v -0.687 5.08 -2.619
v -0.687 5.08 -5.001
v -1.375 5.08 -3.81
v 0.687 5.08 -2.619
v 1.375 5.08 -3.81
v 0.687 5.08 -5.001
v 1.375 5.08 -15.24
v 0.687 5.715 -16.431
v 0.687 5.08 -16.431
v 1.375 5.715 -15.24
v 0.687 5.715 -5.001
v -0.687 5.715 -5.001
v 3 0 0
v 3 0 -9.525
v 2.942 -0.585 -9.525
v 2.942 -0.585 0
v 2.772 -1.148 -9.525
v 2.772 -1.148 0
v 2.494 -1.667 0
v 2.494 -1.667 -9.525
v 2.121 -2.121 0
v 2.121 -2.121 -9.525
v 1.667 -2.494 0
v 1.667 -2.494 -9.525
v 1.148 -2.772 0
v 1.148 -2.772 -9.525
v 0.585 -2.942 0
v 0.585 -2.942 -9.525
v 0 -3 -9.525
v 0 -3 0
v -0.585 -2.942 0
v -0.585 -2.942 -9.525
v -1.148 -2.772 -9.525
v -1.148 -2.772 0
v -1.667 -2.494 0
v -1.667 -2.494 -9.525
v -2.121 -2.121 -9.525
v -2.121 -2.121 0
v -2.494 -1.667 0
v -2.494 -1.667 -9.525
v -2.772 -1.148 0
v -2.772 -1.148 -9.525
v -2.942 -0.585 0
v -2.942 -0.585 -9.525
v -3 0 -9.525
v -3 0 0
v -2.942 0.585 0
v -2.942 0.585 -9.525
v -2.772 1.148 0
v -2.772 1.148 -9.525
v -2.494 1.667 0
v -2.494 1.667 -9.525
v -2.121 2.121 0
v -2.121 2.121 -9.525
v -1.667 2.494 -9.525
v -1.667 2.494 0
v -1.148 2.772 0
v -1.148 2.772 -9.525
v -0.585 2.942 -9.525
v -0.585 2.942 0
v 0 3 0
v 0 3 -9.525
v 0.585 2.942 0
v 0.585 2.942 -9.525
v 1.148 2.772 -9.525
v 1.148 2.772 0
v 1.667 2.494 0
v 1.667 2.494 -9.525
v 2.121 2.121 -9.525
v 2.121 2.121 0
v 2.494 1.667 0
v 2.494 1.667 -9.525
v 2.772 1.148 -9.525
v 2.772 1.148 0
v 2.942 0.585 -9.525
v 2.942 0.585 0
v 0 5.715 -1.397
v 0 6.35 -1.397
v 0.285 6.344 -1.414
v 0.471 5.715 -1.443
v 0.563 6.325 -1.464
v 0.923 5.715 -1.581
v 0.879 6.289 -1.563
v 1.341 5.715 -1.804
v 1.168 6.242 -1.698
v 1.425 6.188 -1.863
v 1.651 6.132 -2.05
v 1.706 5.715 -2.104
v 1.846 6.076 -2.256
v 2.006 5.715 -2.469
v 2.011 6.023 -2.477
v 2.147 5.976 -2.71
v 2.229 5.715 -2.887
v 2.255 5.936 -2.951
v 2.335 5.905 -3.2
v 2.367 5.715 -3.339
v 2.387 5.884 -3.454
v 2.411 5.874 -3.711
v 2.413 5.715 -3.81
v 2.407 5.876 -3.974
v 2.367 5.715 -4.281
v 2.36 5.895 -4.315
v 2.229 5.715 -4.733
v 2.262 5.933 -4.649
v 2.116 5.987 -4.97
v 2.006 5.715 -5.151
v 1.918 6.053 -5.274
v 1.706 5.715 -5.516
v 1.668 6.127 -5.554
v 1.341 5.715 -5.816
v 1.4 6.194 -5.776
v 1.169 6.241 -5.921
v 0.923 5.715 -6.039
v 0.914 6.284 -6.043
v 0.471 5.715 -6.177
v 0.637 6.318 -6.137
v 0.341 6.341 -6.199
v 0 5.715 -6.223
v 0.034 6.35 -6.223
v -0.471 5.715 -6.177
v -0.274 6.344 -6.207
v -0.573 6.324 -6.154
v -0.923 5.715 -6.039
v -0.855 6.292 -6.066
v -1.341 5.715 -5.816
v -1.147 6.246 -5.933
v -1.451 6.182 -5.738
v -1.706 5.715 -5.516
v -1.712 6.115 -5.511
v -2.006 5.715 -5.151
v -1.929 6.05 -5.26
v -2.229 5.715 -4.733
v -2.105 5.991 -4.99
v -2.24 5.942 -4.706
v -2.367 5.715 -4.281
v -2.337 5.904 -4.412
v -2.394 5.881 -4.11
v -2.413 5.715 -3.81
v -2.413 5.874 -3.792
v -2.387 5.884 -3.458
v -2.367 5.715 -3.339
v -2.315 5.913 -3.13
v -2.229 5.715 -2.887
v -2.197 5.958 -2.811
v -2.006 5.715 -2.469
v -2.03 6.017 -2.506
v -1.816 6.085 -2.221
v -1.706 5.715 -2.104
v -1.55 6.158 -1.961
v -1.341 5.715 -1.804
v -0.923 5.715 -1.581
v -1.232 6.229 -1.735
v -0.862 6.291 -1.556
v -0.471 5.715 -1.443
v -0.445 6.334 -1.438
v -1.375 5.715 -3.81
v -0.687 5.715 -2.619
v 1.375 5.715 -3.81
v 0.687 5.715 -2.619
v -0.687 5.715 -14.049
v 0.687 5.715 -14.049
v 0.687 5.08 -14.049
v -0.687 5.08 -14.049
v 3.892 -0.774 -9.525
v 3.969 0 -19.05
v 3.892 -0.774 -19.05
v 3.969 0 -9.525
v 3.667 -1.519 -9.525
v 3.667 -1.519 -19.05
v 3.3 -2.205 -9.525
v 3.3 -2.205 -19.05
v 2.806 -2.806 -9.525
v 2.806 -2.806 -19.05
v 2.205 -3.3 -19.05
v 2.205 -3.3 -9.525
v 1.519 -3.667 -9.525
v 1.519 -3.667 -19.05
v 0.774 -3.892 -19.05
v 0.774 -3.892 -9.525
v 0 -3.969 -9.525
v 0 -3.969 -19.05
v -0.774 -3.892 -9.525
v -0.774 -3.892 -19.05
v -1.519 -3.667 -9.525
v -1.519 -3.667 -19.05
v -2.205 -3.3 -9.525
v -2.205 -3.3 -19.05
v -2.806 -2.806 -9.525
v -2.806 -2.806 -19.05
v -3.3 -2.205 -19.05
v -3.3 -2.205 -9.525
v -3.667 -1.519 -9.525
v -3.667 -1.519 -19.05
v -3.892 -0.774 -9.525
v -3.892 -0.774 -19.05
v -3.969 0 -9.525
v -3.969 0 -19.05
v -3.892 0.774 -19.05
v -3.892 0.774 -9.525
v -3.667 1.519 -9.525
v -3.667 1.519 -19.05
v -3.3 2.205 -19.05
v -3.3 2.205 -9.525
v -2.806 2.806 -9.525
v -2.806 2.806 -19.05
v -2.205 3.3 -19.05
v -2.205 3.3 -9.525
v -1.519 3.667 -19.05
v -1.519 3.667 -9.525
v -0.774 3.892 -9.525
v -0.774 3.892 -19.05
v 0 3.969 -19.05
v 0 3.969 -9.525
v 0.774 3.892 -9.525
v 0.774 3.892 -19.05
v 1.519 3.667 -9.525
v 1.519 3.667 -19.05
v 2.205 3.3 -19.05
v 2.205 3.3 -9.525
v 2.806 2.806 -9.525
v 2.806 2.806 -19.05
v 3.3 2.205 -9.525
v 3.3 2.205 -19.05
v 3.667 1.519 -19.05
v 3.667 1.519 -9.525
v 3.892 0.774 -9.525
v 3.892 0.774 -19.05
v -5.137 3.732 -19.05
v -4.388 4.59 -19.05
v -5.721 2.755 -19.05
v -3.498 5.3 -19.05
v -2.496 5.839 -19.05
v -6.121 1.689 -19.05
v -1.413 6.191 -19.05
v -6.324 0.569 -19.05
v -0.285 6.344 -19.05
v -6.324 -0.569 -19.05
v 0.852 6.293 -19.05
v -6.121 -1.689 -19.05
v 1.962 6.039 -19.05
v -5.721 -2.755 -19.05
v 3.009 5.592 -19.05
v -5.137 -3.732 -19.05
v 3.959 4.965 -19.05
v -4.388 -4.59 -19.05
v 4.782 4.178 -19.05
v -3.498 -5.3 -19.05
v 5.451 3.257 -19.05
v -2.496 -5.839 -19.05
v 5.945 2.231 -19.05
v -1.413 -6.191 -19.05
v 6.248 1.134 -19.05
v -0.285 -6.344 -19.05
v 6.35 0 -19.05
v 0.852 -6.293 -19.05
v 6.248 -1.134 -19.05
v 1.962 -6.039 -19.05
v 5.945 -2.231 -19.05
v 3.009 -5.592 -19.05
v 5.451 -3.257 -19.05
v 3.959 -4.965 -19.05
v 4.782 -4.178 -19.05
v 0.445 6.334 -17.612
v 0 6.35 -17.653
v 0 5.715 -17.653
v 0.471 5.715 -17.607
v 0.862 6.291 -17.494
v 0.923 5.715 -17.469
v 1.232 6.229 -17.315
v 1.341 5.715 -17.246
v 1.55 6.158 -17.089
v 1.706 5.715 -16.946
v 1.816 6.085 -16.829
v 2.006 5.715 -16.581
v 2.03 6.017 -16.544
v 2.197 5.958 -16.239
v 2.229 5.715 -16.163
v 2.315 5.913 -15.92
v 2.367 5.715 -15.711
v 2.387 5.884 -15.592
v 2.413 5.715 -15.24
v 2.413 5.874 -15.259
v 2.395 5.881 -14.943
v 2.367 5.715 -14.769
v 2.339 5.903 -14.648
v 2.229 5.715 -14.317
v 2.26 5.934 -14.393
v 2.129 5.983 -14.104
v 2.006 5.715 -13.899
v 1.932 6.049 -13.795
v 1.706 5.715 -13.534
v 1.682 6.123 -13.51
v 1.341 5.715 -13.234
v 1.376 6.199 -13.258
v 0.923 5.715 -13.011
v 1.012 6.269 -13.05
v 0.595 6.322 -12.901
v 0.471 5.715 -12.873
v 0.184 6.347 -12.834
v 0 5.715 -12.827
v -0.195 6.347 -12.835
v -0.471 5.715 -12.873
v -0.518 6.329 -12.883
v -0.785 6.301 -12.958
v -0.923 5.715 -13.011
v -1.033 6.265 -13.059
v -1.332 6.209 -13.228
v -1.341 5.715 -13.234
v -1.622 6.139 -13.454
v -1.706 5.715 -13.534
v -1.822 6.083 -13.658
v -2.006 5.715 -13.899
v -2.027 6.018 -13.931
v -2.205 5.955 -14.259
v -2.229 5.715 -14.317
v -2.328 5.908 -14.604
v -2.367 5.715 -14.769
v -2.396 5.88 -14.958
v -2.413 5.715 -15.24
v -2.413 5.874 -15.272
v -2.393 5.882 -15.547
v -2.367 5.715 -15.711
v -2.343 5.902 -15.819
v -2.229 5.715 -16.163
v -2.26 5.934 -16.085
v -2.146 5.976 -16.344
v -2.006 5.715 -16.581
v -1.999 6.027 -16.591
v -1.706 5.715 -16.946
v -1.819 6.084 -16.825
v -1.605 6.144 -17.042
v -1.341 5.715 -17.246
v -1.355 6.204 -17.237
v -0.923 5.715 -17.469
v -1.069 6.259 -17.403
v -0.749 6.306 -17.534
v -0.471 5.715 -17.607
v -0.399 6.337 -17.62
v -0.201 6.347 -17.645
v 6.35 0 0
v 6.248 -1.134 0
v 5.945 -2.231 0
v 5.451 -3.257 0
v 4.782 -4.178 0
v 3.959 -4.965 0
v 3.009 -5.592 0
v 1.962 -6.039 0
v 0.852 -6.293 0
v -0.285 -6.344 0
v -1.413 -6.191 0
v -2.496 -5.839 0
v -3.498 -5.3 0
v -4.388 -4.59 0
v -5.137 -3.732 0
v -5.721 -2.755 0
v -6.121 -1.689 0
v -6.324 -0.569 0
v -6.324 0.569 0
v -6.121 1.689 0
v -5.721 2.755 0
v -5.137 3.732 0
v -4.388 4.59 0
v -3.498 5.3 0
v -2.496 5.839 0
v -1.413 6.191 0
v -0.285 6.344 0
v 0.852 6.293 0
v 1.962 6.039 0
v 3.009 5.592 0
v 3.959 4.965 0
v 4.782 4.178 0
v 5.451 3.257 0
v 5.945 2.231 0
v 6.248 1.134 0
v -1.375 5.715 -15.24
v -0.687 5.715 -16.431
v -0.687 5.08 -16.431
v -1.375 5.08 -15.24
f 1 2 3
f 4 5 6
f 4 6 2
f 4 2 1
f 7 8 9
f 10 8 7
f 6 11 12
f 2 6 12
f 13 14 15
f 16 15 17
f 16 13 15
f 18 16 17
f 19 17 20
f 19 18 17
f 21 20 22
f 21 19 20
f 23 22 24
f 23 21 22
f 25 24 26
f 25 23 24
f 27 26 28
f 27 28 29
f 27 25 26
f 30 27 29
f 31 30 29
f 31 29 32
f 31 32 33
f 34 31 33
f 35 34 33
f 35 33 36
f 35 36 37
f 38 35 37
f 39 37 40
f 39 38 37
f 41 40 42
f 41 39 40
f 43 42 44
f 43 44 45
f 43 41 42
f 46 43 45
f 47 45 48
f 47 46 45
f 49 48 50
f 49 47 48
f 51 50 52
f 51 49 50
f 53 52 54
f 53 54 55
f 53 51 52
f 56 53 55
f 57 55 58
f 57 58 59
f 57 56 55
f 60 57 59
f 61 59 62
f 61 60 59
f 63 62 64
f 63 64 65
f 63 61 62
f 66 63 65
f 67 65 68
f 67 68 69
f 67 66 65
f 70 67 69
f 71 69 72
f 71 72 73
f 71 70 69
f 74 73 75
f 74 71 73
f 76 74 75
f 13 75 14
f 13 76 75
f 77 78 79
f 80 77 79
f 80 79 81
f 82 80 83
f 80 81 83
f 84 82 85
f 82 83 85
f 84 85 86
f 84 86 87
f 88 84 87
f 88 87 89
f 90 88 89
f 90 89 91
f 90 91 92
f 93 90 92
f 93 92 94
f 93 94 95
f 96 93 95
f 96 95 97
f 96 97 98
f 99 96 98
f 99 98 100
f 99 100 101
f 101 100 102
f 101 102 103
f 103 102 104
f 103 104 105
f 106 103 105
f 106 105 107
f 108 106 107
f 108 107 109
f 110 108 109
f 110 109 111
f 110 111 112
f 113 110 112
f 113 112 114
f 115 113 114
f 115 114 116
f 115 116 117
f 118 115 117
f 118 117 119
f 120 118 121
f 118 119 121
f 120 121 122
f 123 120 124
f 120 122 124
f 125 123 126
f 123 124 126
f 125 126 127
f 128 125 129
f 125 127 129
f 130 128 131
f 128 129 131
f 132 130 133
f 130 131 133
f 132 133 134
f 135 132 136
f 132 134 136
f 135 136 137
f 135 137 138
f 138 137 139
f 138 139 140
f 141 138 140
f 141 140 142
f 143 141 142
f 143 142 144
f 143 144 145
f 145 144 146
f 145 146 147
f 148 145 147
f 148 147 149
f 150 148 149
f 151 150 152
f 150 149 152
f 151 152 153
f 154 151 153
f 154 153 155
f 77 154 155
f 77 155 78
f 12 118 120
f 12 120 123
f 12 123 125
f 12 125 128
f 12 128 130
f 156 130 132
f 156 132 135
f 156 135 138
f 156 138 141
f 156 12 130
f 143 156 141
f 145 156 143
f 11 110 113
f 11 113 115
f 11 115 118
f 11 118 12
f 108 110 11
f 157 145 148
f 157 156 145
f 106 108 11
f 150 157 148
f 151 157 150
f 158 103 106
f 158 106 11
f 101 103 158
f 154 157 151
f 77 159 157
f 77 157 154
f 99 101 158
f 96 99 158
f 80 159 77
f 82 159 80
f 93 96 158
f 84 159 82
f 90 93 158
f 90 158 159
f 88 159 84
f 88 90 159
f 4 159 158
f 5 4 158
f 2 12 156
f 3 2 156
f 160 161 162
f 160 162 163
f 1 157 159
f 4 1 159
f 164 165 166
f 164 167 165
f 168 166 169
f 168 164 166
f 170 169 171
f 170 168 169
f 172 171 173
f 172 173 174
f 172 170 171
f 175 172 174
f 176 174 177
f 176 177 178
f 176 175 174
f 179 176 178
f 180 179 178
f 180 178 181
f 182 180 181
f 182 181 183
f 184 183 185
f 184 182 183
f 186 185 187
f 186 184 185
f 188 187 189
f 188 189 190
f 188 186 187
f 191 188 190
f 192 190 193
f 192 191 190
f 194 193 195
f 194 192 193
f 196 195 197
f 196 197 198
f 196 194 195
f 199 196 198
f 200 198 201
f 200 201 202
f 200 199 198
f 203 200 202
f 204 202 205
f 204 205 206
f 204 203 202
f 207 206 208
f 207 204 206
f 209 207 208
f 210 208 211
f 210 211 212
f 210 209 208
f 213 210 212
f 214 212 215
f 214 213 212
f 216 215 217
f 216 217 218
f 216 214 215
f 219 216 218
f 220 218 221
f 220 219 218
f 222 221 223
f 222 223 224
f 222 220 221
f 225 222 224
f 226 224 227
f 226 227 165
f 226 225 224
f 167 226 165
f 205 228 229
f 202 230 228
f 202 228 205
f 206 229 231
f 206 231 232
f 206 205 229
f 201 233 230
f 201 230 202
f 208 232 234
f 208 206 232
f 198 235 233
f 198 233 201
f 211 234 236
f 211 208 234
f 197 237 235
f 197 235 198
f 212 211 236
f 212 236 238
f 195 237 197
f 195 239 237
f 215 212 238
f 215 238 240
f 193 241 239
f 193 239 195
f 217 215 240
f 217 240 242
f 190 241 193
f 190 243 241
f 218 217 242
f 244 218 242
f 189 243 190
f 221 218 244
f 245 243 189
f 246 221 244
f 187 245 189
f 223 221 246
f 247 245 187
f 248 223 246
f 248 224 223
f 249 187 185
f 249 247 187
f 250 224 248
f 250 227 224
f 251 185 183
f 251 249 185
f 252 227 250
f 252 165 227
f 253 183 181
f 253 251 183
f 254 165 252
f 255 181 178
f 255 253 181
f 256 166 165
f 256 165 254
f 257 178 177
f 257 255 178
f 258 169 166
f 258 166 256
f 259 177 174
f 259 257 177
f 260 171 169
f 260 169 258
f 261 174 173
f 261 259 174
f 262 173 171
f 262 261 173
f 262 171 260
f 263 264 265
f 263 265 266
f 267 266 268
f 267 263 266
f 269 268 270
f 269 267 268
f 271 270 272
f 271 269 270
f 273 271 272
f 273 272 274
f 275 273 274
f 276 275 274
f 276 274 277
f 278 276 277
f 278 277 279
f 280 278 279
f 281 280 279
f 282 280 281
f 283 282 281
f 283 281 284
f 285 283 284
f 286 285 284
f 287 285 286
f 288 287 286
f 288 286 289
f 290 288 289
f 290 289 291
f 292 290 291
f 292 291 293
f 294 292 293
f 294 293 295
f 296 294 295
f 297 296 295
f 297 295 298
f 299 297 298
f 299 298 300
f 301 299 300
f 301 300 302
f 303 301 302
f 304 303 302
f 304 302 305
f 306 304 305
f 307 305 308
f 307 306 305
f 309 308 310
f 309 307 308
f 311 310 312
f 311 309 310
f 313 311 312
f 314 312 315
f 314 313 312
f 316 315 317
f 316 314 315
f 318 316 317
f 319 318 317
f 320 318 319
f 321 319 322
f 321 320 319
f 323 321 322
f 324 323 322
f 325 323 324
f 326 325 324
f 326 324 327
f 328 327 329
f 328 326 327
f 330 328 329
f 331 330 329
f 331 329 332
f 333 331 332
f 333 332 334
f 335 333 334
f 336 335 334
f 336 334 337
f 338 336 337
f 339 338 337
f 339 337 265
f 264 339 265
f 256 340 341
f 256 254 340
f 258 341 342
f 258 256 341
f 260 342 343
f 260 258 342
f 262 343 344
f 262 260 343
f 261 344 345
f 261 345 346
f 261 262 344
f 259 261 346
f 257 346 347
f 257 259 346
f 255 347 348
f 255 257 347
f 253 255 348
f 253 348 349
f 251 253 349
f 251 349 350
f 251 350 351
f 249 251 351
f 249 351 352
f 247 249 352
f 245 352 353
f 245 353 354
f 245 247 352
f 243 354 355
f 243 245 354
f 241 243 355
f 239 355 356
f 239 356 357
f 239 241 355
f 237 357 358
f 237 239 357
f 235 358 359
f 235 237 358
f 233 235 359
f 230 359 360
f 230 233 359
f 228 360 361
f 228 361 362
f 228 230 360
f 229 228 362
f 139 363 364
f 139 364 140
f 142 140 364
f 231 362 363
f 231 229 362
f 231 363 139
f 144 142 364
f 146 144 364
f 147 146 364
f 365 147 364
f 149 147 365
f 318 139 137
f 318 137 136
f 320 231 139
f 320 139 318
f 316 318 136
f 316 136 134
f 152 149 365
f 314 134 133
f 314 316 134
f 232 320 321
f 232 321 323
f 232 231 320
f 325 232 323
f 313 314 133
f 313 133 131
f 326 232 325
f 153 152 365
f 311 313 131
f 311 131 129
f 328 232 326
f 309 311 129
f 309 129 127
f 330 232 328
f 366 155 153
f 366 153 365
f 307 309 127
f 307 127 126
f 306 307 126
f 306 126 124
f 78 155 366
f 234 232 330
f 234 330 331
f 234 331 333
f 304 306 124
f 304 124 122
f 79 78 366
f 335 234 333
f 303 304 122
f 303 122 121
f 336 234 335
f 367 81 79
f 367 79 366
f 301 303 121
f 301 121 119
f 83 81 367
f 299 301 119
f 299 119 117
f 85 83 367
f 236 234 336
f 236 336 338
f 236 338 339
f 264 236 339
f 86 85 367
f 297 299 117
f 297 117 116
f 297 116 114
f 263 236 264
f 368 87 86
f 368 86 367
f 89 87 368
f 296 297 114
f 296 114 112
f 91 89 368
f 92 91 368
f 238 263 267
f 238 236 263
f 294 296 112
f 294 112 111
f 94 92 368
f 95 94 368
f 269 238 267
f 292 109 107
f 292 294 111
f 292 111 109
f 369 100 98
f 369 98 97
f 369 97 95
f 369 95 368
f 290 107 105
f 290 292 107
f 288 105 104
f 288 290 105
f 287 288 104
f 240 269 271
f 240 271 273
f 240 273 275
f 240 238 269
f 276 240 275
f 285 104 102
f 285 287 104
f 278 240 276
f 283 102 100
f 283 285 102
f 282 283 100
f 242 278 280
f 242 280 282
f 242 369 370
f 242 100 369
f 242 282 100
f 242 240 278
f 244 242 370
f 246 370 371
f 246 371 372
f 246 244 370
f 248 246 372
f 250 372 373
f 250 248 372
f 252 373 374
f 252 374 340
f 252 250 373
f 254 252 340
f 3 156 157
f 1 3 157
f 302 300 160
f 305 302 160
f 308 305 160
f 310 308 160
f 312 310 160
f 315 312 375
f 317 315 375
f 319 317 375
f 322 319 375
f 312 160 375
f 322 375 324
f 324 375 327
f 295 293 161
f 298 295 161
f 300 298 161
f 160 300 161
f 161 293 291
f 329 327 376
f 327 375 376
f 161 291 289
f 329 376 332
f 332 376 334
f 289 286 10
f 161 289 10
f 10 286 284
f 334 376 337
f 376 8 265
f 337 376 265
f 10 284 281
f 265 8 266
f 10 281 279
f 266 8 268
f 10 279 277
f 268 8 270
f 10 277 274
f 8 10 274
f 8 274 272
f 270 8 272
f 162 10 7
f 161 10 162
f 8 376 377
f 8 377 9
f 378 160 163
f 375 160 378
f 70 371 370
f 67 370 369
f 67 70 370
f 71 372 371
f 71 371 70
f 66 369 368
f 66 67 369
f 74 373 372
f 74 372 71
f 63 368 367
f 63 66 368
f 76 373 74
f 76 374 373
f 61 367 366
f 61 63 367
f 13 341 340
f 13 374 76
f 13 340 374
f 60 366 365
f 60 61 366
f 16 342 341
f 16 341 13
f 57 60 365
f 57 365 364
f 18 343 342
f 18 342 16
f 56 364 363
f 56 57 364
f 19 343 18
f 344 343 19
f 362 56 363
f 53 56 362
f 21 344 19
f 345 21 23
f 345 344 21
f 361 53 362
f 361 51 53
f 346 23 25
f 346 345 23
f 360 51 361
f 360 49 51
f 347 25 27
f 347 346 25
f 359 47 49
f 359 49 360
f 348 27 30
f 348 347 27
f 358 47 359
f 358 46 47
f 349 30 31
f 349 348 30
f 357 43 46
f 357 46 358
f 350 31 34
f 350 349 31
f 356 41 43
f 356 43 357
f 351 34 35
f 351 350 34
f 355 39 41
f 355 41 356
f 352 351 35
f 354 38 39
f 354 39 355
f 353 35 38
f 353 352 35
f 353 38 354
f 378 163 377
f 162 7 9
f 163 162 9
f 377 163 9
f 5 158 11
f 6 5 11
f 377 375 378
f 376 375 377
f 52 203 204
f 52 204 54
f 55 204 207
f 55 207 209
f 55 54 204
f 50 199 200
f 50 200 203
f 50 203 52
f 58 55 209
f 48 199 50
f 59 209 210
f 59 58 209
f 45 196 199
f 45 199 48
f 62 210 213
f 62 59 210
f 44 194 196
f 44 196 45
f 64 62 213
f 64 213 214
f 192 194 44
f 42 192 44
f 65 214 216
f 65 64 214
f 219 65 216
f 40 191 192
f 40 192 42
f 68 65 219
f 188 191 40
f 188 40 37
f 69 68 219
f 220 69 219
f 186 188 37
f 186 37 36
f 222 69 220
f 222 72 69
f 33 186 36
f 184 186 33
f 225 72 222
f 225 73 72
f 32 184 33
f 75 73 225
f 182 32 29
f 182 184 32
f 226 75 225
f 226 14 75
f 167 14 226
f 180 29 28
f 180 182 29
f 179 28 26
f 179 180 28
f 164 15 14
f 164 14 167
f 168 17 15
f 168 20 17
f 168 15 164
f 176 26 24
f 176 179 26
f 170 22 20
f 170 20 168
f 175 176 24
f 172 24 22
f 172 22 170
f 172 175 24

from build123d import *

# Parameters (mm, degrees)
SKETCH4_R           = 2.413
CUT_EXTRUDE1_DEPTH  = 1.27
BOSS_EXTRUDE1_START = 0.635
SKETCH3_R           = 2.413
BOSS_EXTRUDE1_DEPTH = 0.635


with BuildPart() as part:
    # Sketch2 → Revolve1 (revolve)
    with BuildSketch(Plane(origin=(0, 0, 0), x_dir=(0, 0, -1), z_dir=(1, 0, 0)), mode=Mode.PRIVATE) as revolve1_sk:
        Polygon((0, 3), (0, 6.35), (19.05, 6.35), (19.05, 3.96875), (9.525, 3.96875), (9.525, 3), align=None)
    revolve(revolve1_sk.sketch.rotate(Axis((0, 0, 0), (0, 0, -1)), 90), axis=Axis((0, 0, 0), (0, 0, -1)))

    # Sketch4 → Cut-Extrude1 (cut)
    with BuildSketch(Plane(origin=(0, 6.35, 0), x_dir=(1, 0, 0), z_dir=(0, 1, 0))):
        with Locations(Location((0, 3.81, 0), (0, 0, 270))):
            Circle(SKETCH4_R)
    cut_extrude1 = extrude(amount=-CUT_EXTRUDE1_DEPTH, mode=Mode.SUBTRACT)

    # Sketch3 → Boss-Extrude1 (add)
    with BuildSketch(Plane(origin=(0, 5.08, 0), x_dir=(1, 0, 0), z_dir=(0, 1, 0)).offset(BOSS_EXTRUDE1_START)):
        with Locations(Location((0, 3.81, 0), (0, 0, 270))):
            Circle(SKETCH3_R)
        Polygon((1.374815329, 3.81), (0.687407664, 5.000625), (-0.687407664, 5.000625), (-1.374815329, 3.81), (-0.687407664, 2.619375), (0.687407664, 2.619375), align=None, mode=Mode.SUBTRACT)
    boss_extrude1 = extrude(amount=-BOSS_EXTRUDE1_DEPTH)

    # Mirror1: Cut-Extrude1, Boss-Extrude1 across plane
    add(cut_extrude1.mirror(Plane.XY.offset(-9.525)), mode=Mode.SUBTRACT)
    add(boss_extrude1.mirror(Plane.XY.offset(-9.525)))


solid = part.part
